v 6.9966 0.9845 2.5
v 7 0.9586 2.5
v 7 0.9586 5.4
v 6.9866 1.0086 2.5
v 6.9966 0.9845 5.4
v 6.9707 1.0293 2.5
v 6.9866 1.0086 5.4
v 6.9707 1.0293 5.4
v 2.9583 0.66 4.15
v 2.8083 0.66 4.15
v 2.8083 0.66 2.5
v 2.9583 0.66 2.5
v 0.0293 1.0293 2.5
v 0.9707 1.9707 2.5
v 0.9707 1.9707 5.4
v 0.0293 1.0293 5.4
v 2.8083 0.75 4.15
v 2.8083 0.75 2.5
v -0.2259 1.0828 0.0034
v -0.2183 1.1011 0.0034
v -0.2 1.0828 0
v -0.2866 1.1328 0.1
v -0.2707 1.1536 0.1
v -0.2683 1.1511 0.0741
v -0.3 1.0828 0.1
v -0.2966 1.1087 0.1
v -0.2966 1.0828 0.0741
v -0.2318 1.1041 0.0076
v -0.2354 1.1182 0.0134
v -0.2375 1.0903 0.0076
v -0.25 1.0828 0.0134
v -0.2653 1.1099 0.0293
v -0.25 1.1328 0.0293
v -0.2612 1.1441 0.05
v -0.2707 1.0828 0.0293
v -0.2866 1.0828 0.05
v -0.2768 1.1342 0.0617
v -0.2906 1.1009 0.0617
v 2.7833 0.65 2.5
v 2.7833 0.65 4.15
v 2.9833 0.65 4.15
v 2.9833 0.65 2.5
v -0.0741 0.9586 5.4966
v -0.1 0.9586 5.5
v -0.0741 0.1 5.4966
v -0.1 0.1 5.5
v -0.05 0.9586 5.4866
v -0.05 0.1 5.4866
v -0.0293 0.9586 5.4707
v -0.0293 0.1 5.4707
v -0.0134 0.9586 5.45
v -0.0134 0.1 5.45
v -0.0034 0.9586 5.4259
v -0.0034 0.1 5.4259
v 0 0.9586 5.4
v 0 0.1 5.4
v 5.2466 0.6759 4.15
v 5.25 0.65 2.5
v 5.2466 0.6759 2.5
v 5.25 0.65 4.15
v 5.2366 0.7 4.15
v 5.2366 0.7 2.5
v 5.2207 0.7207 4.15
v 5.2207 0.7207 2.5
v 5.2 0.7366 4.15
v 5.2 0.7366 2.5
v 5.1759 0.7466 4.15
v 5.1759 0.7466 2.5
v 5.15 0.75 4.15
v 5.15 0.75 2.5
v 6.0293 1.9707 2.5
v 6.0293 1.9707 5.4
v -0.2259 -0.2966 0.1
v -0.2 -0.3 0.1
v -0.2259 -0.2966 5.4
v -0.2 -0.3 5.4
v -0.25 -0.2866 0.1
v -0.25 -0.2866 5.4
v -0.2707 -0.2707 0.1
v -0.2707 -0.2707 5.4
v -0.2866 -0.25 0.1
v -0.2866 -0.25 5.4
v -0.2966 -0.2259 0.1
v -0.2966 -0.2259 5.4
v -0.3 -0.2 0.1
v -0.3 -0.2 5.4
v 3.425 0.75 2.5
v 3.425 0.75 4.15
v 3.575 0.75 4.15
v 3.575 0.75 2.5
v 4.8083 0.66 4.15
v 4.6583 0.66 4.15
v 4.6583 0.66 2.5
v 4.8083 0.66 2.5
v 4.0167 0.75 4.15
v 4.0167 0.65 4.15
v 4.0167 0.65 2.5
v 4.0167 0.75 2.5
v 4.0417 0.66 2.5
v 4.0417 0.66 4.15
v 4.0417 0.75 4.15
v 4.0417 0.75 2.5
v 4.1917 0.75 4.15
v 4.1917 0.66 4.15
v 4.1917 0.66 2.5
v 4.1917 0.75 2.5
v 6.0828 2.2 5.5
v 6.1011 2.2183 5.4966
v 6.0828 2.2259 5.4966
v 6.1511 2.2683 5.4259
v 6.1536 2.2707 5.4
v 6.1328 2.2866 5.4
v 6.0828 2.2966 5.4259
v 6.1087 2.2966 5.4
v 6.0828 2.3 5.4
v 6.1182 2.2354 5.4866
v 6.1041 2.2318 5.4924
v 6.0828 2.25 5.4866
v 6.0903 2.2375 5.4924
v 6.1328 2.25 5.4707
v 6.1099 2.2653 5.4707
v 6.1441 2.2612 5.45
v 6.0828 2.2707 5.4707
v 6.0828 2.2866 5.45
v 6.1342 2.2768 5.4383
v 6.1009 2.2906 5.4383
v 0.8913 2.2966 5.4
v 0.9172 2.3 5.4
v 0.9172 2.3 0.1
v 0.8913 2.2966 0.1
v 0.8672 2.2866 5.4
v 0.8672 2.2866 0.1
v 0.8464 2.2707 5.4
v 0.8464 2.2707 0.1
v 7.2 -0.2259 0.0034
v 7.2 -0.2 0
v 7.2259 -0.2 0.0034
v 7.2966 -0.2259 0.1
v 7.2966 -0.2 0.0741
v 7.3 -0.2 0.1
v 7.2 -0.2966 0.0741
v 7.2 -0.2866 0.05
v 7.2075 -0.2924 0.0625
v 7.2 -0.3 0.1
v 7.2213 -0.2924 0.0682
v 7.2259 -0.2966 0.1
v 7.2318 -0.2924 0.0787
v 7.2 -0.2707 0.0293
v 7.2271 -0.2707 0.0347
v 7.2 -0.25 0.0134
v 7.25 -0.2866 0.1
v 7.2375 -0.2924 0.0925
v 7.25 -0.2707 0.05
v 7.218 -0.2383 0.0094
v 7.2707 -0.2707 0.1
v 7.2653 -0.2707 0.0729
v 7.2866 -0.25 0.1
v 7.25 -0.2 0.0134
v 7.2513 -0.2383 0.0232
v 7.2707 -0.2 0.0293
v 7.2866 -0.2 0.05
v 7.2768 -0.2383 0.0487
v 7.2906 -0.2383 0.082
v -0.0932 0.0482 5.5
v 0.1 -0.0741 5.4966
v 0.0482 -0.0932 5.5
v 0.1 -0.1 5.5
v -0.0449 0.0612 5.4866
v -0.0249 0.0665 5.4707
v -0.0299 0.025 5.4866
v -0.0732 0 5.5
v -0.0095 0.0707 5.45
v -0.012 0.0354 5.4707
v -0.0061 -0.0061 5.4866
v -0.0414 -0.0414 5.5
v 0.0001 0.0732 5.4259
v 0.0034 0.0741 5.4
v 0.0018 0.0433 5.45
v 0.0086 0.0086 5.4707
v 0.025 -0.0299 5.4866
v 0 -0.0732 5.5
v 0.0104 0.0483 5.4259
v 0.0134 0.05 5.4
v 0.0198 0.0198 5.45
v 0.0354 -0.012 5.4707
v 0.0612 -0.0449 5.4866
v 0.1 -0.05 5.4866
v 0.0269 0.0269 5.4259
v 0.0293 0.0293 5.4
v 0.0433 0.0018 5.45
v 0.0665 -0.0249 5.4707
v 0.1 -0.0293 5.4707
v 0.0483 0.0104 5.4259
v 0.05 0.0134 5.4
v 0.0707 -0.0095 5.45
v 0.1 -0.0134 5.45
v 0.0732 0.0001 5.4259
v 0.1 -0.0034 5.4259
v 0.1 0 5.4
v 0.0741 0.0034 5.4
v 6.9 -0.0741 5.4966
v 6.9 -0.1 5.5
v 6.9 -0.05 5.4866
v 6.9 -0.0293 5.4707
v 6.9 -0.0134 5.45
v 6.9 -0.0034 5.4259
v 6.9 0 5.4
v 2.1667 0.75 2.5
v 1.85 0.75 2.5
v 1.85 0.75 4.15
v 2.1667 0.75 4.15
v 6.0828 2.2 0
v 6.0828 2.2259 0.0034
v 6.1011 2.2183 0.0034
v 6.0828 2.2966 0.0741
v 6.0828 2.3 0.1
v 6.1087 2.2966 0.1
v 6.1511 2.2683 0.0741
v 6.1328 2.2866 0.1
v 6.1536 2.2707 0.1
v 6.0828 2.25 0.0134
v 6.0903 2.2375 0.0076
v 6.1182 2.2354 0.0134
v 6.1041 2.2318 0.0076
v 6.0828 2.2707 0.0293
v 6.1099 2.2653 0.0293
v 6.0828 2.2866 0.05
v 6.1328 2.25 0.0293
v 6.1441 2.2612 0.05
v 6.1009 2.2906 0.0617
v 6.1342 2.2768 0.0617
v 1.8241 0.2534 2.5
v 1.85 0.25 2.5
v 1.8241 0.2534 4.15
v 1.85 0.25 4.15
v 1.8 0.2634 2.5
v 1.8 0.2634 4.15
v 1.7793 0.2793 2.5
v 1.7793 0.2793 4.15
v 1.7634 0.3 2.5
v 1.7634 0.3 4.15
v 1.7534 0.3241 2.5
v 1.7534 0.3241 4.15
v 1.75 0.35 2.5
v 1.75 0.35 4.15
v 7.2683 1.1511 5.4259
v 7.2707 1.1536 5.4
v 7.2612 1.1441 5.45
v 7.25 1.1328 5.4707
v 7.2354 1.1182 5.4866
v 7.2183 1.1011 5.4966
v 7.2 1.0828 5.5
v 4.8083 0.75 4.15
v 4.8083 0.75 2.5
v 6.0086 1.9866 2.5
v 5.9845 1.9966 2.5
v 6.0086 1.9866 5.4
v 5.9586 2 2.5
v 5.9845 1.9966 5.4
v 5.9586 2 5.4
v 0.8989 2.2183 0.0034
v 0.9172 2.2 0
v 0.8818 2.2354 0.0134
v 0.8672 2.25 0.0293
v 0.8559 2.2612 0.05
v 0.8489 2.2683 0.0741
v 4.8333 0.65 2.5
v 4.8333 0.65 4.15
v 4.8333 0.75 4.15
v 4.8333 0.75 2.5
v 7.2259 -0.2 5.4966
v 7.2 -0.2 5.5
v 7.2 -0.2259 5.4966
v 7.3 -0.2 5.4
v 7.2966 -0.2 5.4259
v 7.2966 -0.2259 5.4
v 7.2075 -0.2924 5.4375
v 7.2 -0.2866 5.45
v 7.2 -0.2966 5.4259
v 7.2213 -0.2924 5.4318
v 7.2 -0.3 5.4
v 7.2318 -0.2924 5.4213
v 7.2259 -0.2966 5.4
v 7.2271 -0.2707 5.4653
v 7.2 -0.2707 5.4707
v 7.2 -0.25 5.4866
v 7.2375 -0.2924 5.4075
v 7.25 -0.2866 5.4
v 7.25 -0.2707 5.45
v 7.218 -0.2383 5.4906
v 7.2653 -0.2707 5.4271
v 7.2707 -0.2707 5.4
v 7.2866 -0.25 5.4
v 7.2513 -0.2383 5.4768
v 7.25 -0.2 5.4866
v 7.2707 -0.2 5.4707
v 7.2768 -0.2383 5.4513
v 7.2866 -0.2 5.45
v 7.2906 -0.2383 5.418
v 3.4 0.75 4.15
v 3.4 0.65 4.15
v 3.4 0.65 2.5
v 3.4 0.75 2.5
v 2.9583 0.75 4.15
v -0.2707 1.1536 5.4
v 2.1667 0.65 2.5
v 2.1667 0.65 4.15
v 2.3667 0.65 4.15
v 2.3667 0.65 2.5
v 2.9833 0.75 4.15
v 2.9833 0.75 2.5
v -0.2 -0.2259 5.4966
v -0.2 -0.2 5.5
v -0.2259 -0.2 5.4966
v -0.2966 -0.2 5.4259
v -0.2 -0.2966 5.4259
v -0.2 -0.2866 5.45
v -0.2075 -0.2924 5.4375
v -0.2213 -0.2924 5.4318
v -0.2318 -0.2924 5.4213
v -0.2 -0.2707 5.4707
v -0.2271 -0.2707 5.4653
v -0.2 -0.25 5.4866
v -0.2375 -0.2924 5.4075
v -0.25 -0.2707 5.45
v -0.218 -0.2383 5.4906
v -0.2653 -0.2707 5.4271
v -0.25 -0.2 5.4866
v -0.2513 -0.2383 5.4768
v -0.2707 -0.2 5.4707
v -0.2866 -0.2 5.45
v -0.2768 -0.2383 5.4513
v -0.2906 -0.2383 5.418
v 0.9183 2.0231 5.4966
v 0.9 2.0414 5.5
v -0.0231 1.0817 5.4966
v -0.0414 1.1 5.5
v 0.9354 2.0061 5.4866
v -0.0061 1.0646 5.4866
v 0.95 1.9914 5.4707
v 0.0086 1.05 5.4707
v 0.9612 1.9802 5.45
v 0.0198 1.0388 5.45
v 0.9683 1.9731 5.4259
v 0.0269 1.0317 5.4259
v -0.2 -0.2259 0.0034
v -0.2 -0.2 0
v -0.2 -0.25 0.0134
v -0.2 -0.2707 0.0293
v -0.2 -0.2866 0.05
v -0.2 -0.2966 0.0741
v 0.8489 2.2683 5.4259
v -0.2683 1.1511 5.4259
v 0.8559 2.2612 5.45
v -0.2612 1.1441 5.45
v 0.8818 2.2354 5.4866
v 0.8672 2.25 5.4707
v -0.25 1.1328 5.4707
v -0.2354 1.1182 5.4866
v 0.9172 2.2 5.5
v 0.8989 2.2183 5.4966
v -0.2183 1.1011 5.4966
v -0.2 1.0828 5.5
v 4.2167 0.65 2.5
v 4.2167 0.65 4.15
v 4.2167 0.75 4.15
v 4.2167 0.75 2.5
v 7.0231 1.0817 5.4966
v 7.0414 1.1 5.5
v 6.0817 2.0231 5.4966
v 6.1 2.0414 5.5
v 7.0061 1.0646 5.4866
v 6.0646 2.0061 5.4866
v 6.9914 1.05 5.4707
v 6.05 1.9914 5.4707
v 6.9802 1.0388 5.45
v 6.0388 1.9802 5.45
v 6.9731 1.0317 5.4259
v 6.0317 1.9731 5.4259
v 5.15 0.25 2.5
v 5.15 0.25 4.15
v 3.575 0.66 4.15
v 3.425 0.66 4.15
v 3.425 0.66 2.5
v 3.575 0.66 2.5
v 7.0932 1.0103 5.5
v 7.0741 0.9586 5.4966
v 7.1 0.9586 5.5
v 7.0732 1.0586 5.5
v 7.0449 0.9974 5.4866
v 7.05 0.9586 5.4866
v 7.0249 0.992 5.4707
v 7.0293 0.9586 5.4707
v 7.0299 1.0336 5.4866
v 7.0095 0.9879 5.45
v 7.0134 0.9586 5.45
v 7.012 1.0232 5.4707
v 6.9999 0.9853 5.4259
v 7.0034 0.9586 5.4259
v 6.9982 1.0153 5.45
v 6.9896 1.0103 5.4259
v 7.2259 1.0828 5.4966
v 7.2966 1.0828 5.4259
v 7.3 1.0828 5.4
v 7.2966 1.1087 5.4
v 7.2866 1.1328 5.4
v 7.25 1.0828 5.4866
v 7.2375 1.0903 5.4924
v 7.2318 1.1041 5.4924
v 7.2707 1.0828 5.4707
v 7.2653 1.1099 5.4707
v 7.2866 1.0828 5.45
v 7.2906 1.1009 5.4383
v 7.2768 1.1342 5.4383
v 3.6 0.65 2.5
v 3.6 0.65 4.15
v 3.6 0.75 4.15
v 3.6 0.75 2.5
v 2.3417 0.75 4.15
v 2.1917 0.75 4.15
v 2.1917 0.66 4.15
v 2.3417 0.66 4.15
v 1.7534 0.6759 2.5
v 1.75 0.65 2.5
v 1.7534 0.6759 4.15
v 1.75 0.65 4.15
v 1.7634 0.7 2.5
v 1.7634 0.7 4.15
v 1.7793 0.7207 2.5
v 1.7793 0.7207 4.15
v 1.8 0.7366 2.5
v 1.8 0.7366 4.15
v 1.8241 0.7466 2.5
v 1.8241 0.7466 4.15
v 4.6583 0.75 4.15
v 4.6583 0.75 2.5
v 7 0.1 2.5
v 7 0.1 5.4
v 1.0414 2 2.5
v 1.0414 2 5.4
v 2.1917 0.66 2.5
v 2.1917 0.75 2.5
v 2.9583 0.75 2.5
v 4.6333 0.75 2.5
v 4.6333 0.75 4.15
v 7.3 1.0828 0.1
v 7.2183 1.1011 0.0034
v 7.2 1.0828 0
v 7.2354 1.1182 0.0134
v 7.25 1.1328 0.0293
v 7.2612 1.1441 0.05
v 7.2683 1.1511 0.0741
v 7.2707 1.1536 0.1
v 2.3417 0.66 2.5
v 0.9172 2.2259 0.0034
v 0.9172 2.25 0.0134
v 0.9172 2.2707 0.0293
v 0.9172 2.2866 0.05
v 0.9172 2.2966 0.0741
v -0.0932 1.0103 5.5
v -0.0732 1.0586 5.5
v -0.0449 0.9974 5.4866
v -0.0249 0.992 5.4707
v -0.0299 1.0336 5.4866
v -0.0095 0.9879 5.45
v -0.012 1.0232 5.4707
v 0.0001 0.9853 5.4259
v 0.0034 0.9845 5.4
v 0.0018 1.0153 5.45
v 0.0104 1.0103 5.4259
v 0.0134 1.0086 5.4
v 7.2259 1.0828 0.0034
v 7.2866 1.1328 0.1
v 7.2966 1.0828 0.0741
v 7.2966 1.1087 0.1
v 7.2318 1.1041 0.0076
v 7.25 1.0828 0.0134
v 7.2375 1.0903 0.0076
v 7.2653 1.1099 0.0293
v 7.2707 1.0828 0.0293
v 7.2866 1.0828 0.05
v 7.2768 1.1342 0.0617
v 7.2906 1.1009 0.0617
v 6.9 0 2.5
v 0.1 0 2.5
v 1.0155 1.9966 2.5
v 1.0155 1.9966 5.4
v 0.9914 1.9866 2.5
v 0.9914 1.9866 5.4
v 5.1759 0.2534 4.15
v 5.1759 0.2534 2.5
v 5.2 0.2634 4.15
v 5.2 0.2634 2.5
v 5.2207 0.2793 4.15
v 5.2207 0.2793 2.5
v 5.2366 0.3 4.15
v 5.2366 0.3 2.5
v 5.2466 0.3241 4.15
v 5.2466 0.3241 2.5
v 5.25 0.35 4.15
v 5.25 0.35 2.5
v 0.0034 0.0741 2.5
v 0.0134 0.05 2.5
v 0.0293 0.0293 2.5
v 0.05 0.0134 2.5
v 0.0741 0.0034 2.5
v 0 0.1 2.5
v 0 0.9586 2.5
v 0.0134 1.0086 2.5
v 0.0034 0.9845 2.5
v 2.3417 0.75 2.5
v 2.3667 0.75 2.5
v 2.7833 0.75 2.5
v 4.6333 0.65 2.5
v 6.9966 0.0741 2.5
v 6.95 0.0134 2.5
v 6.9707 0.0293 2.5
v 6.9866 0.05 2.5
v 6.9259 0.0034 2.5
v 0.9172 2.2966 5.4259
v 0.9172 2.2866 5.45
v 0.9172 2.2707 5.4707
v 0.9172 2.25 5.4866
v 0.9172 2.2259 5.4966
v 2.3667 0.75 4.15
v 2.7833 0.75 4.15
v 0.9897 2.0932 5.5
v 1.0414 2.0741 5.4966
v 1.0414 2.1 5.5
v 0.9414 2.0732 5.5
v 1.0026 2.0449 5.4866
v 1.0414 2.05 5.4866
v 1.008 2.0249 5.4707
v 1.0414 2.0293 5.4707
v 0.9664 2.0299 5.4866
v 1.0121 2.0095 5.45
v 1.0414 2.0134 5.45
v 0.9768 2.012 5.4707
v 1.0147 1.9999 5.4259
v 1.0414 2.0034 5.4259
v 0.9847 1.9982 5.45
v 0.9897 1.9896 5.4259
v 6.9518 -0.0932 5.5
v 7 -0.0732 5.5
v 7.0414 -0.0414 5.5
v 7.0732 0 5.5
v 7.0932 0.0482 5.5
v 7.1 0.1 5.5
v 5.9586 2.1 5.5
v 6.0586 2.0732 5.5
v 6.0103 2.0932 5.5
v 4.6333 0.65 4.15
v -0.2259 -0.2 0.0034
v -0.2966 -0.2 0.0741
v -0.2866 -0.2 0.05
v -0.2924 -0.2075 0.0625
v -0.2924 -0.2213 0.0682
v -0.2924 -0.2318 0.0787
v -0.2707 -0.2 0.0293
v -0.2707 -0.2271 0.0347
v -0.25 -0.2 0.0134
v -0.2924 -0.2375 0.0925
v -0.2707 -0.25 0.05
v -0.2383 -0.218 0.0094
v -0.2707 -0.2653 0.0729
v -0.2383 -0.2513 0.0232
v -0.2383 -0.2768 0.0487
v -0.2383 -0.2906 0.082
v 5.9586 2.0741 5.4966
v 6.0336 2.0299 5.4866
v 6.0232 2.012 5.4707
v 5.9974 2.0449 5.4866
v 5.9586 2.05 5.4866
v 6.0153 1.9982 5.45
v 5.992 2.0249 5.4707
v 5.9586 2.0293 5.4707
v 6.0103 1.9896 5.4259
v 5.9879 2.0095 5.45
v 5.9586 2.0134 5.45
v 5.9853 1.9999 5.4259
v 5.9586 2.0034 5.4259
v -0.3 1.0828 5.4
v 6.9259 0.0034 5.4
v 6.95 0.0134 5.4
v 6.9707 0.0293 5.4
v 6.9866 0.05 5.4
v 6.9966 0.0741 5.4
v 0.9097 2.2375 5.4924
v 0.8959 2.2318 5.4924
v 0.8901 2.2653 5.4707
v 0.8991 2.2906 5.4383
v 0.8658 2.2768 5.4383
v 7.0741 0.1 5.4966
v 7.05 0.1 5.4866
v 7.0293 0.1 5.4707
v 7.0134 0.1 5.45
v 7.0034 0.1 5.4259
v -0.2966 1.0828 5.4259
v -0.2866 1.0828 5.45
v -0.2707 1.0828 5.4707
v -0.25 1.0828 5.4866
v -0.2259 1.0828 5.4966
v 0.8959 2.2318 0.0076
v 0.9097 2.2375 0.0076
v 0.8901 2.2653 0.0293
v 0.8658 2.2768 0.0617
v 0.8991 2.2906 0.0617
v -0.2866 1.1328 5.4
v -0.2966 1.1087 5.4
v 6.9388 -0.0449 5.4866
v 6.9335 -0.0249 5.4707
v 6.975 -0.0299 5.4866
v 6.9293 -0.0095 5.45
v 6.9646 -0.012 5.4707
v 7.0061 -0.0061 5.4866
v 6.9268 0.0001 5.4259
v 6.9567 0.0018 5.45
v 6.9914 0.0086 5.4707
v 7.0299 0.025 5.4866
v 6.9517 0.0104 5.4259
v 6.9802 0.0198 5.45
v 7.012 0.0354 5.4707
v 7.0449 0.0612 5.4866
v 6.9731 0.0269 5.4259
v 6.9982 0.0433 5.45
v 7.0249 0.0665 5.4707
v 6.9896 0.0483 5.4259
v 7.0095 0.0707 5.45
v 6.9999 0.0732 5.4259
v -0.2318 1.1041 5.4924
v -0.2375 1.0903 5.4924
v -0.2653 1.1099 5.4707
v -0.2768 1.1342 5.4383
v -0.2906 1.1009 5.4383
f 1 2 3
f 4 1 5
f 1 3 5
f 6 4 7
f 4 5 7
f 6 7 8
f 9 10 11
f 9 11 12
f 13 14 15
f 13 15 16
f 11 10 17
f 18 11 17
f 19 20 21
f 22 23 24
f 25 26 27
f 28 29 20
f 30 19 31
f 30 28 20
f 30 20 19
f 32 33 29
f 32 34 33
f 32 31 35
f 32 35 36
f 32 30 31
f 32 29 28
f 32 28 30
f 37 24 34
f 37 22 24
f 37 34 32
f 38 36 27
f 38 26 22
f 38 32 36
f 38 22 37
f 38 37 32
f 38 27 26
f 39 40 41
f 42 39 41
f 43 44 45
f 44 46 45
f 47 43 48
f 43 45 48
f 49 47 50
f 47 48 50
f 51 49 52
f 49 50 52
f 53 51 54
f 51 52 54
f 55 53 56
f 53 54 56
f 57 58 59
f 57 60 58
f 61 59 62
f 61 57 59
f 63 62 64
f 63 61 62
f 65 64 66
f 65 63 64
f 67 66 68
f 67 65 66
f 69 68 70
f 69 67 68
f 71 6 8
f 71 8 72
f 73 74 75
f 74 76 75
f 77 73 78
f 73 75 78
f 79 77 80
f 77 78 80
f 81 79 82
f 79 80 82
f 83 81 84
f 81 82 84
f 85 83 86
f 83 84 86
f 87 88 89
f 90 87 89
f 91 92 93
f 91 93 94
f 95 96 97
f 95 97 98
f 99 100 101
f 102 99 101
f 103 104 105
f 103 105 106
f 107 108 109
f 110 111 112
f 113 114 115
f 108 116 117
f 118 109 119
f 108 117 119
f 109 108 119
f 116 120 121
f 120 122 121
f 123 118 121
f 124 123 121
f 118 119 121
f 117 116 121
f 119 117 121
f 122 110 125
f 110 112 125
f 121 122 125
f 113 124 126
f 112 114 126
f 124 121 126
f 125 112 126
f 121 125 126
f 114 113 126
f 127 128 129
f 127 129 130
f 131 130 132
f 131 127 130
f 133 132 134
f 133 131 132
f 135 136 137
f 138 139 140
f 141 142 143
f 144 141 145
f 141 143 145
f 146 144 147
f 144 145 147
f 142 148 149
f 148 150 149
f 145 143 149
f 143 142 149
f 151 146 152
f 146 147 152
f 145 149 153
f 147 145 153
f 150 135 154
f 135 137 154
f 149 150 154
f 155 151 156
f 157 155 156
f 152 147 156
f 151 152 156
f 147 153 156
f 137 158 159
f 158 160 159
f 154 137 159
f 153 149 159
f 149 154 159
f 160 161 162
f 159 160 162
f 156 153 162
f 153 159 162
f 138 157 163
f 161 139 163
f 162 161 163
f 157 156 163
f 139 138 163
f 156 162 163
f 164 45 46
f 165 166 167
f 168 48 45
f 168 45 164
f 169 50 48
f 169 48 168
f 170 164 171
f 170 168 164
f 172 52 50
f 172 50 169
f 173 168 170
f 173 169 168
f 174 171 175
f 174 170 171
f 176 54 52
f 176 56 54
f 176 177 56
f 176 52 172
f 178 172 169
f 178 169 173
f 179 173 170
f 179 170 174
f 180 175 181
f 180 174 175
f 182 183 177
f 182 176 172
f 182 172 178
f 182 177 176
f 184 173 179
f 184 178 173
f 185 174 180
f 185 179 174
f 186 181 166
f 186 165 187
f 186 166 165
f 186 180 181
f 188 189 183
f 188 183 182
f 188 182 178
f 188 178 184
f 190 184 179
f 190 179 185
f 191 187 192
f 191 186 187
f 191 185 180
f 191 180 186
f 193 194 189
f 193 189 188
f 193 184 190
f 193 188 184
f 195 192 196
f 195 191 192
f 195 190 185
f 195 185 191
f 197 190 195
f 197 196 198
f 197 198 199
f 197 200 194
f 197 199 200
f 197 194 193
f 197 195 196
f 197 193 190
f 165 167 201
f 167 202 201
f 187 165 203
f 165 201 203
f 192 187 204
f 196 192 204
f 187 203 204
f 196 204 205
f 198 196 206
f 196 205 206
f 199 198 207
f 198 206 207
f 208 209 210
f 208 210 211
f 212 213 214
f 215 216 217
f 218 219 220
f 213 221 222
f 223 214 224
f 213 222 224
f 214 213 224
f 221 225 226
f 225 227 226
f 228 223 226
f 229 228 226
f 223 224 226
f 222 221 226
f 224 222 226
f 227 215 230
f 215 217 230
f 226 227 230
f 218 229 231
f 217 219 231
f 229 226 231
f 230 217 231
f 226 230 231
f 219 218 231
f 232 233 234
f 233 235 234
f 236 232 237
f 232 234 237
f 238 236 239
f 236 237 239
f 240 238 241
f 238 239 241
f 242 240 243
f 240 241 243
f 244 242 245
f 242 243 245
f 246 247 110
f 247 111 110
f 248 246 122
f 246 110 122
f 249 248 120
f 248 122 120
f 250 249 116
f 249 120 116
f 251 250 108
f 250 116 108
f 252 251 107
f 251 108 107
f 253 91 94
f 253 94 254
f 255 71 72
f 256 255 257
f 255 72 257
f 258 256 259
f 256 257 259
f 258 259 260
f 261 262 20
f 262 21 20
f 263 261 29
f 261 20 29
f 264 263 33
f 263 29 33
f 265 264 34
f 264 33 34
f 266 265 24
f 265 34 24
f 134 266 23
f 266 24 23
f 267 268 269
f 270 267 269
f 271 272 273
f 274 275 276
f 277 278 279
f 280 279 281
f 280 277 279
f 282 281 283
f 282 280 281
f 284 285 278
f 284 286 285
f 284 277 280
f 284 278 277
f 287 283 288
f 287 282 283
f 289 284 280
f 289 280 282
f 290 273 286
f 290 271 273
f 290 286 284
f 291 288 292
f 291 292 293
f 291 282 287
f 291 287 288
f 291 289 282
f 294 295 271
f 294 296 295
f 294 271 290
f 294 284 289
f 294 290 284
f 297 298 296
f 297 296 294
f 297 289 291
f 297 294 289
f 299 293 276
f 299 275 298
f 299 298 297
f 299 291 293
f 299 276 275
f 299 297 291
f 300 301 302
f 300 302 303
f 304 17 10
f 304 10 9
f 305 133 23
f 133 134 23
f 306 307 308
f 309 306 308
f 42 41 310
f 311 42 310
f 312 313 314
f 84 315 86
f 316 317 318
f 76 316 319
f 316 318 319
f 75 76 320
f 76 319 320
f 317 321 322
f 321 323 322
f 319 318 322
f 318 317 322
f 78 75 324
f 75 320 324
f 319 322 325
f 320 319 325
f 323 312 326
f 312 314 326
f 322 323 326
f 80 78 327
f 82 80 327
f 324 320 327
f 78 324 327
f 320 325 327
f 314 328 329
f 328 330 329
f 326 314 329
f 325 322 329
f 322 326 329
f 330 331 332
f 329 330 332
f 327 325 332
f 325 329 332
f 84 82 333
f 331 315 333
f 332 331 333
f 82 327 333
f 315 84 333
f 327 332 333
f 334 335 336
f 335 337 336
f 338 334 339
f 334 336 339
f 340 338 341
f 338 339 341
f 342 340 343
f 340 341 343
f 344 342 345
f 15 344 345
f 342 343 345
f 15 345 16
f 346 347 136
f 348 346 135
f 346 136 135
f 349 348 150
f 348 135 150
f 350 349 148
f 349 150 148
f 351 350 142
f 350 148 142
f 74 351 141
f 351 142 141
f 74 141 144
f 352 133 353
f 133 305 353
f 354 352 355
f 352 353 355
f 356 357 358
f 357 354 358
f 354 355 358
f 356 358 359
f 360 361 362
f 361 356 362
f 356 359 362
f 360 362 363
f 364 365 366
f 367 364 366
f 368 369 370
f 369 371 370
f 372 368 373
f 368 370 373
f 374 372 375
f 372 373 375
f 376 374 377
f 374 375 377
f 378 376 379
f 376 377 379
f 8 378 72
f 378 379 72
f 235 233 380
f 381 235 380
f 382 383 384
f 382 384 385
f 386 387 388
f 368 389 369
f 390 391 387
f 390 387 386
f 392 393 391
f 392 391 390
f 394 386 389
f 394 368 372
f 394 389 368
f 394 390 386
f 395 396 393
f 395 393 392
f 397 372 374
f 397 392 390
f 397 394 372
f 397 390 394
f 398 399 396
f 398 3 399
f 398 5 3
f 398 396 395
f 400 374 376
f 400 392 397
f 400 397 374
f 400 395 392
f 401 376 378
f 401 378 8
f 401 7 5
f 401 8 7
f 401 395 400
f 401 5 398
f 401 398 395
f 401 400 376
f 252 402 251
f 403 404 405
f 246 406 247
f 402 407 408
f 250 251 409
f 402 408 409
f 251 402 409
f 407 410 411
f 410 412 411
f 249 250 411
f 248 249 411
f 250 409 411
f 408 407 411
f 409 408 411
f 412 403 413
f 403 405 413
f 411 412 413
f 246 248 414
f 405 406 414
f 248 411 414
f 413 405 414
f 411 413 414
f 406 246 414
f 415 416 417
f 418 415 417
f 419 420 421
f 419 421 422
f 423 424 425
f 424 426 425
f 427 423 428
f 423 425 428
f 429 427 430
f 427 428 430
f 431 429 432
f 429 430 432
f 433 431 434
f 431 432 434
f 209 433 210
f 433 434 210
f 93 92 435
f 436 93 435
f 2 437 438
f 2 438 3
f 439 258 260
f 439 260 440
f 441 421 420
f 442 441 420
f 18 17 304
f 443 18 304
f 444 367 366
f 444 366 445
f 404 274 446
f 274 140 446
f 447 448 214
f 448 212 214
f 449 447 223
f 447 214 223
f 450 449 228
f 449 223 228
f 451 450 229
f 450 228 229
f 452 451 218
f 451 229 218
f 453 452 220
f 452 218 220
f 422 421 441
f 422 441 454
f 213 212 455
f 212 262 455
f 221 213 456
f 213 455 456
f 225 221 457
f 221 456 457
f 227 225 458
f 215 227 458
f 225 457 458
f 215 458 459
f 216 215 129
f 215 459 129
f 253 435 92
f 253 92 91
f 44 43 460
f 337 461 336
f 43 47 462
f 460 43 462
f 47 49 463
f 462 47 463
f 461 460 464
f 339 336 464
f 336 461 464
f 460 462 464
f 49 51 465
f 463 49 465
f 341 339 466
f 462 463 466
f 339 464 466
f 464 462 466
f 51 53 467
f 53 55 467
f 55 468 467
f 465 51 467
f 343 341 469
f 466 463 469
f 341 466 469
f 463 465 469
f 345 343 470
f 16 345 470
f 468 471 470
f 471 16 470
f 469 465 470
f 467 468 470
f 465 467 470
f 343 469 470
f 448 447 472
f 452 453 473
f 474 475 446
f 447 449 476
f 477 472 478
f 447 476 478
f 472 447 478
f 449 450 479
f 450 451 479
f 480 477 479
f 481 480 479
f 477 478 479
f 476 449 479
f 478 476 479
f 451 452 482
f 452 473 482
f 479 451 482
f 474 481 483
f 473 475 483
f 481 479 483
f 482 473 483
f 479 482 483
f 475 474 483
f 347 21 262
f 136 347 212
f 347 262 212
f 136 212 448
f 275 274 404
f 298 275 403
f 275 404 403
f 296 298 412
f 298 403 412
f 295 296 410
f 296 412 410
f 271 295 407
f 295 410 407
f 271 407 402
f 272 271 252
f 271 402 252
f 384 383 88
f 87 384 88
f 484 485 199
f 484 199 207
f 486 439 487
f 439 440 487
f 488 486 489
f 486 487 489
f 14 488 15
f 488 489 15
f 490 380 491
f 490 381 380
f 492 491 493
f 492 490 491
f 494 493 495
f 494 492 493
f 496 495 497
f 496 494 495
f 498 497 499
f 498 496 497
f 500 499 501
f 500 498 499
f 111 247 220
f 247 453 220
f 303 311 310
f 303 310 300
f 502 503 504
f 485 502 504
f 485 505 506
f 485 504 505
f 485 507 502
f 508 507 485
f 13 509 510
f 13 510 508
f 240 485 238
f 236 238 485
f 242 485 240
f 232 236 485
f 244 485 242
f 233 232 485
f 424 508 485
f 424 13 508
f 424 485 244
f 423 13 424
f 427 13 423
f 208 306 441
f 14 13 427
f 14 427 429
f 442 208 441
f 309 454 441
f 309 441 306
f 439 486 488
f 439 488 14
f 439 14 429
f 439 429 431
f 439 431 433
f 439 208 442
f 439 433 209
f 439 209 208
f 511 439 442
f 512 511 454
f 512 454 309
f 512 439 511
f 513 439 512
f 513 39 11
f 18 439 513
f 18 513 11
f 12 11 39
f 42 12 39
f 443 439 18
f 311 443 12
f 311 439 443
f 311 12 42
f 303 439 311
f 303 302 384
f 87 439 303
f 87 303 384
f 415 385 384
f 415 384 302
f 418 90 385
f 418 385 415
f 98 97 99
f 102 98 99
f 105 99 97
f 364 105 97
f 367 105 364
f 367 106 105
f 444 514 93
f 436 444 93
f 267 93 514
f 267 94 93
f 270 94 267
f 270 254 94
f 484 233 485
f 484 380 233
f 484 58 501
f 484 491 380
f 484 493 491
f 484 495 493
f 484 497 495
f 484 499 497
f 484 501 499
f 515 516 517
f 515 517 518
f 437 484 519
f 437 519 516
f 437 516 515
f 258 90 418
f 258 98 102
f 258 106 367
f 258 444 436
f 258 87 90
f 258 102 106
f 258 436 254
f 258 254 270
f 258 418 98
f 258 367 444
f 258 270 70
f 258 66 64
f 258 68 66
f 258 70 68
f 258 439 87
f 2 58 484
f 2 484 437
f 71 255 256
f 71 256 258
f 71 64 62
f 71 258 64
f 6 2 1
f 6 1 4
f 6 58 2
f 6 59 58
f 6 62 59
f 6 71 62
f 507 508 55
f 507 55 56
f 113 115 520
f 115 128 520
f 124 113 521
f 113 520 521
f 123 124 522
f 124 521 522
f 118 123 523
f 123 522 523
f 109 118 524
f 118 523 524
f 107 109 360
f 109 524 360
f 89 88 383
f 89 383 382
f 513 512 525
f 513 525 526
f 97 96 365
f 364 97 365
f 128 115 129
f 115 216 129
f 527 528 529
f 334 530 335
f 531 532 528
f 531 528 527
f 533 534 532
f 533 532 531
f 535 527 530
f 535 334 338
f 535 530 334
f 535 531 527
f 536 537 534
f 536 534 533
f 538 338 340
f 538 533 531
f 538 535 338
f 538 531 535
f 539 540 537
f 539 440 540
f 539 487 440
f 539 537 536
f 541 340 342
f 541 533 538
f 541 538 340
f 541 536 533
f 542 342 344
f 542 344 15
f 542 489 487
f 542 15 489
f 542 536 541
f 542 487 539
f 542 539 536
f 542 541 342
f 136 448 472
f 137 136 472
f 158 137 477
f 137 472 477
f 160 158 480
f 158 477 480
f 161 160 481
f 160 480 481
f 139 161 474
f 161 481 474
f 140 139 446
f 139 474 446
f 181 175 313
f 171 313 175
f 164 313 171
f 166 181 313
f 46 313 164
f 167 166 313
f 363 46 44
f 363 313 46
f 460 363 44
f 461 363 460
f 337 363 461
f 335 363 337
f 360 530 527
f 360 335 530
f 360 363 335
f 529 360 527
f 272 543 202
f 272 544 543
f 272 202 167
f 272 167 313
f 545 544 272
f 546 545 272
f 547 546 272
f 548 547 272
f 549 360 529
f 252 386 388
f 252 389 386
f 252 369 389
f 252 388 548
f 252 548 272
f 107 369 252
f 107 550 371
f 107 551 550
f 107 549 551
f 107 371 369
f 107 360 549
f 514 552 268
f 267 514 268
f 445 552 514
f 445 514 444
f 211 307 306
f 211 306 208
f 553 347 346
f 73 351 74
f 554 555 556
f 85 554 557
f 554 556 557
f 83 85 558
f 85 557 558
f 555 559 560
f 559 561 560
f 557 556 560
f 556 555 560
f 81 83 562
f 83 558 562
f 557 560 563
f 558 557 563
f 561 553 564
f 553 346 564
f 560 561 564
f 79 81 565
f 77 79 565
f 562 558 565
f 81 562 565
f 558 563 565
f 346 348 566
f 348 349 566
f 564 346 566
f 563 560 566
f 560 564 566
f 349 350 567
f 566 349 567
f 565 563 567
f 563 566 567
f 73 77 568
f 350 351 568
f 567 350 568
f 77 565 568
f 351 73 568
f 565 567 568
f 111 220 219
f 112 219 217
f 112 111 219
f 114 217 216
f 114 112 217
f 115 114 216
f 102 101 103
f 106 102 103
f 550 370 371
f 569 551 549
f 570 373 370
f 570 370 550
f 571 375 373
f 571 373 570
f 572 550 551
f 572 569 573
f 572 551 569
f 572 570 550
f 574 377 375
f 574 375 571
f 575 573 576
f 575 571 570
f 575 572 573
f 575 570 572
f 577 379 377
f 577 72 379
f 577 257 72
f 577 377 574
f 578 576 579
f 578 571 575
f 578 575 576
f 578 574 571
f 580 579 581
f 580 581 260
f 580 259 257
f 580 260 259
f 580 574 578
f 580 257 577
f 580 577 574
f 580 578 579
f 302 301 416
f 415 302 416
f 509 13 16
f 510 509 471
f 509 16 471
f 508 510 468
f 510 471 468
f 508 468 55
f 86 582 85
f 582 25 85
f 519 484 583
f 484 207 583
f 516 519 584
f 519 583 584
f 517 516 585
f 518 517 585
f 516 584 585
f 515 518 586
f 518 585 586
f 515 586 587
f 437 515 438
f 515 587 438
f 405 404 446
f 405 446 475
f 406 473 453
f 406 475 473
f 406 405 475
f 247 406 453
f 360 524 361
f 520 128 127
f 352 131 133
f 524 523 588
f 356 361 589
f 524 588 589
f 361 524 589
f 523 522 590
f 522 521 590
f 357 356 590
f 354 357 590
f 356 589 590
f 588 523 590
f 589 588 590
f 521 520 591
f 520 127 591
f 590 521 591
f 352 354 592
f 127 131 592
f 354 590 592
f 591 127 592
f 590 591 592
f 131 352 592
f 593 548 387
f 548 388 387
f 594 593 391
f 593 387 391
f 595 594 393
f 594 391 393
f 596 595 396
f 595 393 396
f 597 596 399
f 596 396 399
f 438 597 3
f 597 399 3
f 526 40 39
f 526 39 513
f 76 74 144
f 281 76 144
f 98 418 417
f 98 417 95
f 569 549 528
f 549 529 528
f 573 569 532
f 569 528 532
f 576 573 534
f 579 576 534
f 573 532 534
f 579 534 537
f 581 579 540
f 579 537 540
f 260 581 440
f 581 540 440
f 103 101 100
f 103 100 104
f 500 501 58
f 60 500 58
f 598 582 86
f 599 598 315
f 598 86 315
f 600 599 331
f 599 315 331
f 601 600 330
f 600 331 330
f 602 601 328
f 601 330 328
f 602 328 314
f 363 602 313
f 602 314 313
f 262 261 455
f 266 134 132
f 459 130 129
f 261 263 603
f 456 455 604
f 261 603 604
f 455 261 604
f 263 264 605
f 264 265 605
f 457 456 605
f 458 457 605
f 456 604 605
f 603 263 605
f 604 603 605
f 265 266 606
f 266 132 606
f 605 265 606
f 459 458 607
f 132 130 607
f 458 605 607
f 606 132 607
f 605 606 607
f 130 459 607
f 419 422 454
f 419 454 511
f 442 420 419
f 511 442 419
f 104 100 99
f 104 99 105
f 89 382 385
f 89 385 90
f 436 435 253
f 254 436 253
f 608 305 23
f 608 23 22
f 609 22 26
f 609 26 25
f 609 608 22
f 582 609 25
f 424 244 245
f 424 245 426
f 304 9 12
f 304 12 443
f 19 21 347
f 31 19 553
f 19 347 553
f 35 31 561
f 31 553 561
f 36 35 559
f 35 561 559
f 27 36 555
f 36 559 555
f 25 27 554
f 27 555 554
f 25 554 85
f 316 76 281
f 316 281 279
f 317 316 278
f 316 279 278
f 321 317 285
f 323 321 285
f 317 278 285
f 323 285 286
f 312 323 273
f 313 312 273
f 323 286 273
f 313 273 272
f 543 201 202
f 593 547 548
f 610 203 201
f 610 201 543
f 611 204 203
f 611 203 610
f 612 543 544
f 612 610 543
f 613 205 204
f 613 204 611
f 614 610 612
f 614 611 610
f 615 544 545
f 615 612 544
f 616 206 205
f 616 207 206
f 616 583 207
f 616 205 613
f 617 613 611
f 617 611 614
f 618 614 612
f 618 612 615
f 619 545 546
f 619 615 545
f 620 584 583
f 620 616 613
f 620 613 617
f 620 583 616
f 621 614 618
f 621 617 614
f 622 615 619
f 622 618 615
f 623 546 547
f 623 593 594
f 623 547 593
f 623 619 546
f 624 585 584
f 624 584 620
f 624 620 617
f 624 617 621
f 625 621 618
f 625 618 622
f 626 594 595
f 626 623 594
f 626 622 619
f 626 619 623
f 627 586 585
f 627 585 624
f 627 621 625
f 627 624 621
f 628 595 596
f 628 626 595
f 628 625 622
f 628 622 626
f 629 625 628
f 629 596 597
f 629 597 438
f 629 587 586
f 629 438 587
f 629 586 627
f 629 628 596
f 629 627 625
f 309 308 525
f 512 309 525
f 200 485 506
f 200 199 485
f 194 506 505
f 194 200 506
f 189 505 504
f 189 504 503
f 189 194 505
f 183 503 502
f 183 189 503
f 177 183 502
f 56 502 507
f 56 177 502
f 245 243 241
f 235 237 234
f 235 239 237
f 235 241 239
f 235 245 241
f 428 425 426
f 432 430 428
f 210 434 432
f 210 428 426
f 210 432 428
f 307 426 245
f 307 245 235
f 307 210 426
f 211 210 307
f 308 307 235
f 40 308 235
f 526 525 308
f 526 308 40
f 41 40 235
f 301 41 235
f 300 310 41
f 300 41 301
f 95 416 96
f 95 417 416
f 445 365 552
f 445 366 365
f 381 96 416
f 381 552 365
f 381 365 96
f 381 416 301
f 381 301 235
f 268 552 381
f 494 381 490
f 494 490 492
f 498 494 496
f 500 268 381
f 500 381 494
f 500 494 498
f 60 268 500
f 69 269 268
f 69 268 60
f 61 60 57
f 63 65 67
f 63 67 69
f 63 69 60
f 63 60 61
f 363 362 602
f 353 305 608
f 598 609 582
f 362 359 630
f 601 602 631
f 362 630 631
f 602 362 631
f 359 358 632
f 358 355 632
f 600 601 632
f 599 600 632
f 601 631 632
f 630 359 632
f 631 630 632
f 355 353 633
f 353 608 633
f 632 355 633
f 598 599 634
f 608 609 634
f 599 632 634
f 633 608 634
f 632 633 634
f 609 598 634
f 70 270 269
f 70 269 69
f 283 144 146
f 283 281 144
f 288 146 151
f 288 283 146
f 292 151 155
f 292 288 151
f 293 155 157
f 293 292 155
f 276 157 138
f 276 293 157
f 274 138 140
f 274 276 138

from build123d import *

# Parameters (mm, degrees)
EXTRUDE_THIN1_DEPTH = 5.5
BOSS_EXTRUDE1_DEPTH = 2.5
SKETCH3_W           = 3.5
SKETCH3_H           = 0.5
BOSS_EXTRUDE2_DEPTH = 1.65
SKETCH4_W           = 0.2
SKETCH4_H           = 0.1
CUT_EXTRUDE1_DEPTH  = 1.65
BOSS_EXTRUDE4_REACH = 6.15
SKETCH5_W           = 0.15
SKETCH5_H           = 0.09
FILLET1_R           = 0.1


with BuildPart() as part:
    # Sketch1 → Extrude-Thin1 (new body)
    with BuildSketch(Plane.XY):
        Polygon((-0.3, -0.3), (7.3, -0.3), (7.3, 1.124264069), (6.124264069, 2.3), (0.875735931, 2.3), (-0.3, 1.124264069), align=None)
        Polygon((0, 0), (7, 0), (7, 1), (6, 2), (1, 2), (0, 1), align=None, mode=Mode.SUBTRACT)
    extrude(amount=EXTRUDE_THIN1_DEPTH)

    # Sketch2 → Boss-Extrude1 (add)
    with BuildSketch(Plane(origin=(0, 0, 0), x_dir=(-1, 0, 0), z_dir=(0, 0, -1))):
        Polygon((-6, 2), (-1, 2), (0, 1), (0, 0), (-7, 0), (-7, 1), align=None)
    extrude(amount=-BOSS_EXTRUDE1_DEPTH)

    # Sketch3 → Boss-Extrude2 (add)
    with BuildSketch(Plane.XY.offset(2.5)):
        with Locations((3.5, 0.5)):
            Rectangle(SKETCH3_W, SKETCH3_H)
    extrude(amount=BOSS_EXTRUDE2_DEPTH)

    # Sketch4 → Cut-Extrude1 (cut)
    with BuildSketch(Plane.XY.offset(4.15)):
        with Locations((2.266666667, 0.7)):
            Rectangle(SKETCH4_W, SKETCH4_H)
        with Locations((2.883333333, 0.7)):
            Rectangle(SKETCH4_W, SKETCH4_H)
        with Locations((3.5, 0.7)):
            Rectangle(SKETCH4_W, SKETCH4_H)
        with Locations((4.116666667, 0.7)):
            Rectangle(SKETCH4_W, SKETCH4_H)
        with Locations((4.733333333, 0.7)):
            Rectangle(SKETCH4_W, SKETCH4_H)
    extrude(amount=-CUT_EXTRUDE1_DEPTH, mode=Mode.SUBTRACT)

    # Sketch5 → Boss-Extrude4 (add, up to next)
    with BuildSketch(Plane.XY.offset(4.15), mode=Mode.PRIVATE) as boss_extrude4_sk1:
        with Locations((2.266666667, 0.705)):
            Rectangle(SKETCH5_W, SKETCH5_H)
    boss_extrude4_tool1 = extrude(boss_extrude4_sk1.sketch, amount=-BOSS_EXTRUDE4_REACH, mode=Mode.PRIVATE) - part.part
    add(boss_extrude4_tool1.solids().sort_by_distance((2.266667, 0.705, 4.15))[0])
    # Sketch5 → Boss-Extrude4 (add, up to next)
    with BuildSketch(Plane.XY.offset(4.15), mode=Mode.PRIVATE) as boss_extrude4_sk2:
        with Locations((2.883333333, 0.705)):
            Rectangle(SKETCH5_W, SKETCH5_H)
    boss_extrude4_tool2 = extrude(boss_extrude4_sk2.sketch, amount=-BOSS_EXTRUDE4_REACH, mode=Mode.PRIVATE) - part.part
    add(boss_extrude4_tool2.solids().sort_by_distance((2.883333, 0.705, 4.15))[0])
    # Sketch5 → Boss-Extrude4 (add, up to next)
    with BuildSketch(Plane.XY.offset(4.15), mode=Mode.PRIVATE) as boss_extrude4_sk3:
        with Locations((3.5, 0.705)):
            Rectangle(SKETCH5_W, SKETCH5_H)
    boss_extrude4_tool3 = extrude(boss_extrude4_sk3.sketch, amount=-BOSS_EXTRUDE4_REACH, mode=Mode.PRIVATE) - part.part
    add(boss_extrude4_tool3.solids().sort_by_distance((3.5, 0.705, 4.15))[0])
    # Sketch5 → Boss-Extrude4 (add, up to next)
    with BuildSketch(Plane.XY.offset(4.15), mode=Mode.PRIVATE) as boss_extrude4_sk4:
        with Locations((4.116666667, 0.705)):
            Rectangle(SKETCH5_W, SKETCH5_H)
    boss_extrude4_tool4 = extrude(boss_extrude4_sk4.sketch, amount=-BOSS_EXTRUDE4_REACH, mode=Mode.PRIVATE) - part.part
    add(boss_extrude4_tool4.solids().sort_by_distance((4.116667, 0.705, 4.15))[0])
    # Sketch5 → Boss-Extrude4 (add, up to next)
    with BuildSketch(Plane.XY.offset(4.15), mode=Mode.PRIVATE) as boss_extrude4_sk5:
        with Locations((4.733333333, 0.705)):
            Rectangle(SKETCH5_W, SKETCH5_H)
    boss_extrude4_tool5 = extrude(boss_extrude4_sk5.sketch, amount=-BOSS_EXTRUDE4_REACH, mode=Mode.PRIVATE) - part.part
    add(boss_extrude4_tool5.solids().sort_by_distance((4.733333, 0.705, 4.15))[0])

    # Fillet1
    fillet1_edges = [part.edges().sort_by_distance(p)[0] for p in [
        (7.3, 0.412132034, 5.5),
        (6.712132034, 1.712132034, 5.5),
        (3.5, 2.3, 5.5),
        (0, 1, 4),
        (0.287867966, 1.712132034, 5.5),
        (0, 0, 4),
        (7, 0, 4),
        (7, 1, 4),
        (6, 2, 4),
        (1, 2, 4),
        (0, 0.5, 5.5),
        (3.5, 0, 5.5),
        (7, 0.5, 5.5),
        (6.5, 1.5, 5.5),
        (3.5, 2, 5.5),
        (0.5, 1.5, 5.5),
        (-0.3, 0.412132034, 5.5),
        (0.287867966, 1.712132034, 0),
        (3.5, 2.3, 0),
        (6.712132034, 1.712132034, 0),
        (7.3, 0.412132034, 0),
        (3.5, -0.3, 0),
        (-0.3, 0.412132034, 0),
        (1.75, 0.75, 3.325),
        (1.75, 0.25, 3.325),
        (5.25, 0.25, 3.325),
        (5.25, 0.75, 3.325),
        (3.5, -0.3, 5.5),
        (-0.3, 1.124264069, 2.75),
        (0.875735931, 2.3, 2.75),
        (6.124264069, 2.3, 2.75),
        (7.3, 1.124264069, 2.75),
        (7.3, -0.3, 2.75),
        (-0.3, -0.3, 2.75),
    ]]
    fillet(fillet1_edges, radius=FILLET1_R)


solid = part.part
